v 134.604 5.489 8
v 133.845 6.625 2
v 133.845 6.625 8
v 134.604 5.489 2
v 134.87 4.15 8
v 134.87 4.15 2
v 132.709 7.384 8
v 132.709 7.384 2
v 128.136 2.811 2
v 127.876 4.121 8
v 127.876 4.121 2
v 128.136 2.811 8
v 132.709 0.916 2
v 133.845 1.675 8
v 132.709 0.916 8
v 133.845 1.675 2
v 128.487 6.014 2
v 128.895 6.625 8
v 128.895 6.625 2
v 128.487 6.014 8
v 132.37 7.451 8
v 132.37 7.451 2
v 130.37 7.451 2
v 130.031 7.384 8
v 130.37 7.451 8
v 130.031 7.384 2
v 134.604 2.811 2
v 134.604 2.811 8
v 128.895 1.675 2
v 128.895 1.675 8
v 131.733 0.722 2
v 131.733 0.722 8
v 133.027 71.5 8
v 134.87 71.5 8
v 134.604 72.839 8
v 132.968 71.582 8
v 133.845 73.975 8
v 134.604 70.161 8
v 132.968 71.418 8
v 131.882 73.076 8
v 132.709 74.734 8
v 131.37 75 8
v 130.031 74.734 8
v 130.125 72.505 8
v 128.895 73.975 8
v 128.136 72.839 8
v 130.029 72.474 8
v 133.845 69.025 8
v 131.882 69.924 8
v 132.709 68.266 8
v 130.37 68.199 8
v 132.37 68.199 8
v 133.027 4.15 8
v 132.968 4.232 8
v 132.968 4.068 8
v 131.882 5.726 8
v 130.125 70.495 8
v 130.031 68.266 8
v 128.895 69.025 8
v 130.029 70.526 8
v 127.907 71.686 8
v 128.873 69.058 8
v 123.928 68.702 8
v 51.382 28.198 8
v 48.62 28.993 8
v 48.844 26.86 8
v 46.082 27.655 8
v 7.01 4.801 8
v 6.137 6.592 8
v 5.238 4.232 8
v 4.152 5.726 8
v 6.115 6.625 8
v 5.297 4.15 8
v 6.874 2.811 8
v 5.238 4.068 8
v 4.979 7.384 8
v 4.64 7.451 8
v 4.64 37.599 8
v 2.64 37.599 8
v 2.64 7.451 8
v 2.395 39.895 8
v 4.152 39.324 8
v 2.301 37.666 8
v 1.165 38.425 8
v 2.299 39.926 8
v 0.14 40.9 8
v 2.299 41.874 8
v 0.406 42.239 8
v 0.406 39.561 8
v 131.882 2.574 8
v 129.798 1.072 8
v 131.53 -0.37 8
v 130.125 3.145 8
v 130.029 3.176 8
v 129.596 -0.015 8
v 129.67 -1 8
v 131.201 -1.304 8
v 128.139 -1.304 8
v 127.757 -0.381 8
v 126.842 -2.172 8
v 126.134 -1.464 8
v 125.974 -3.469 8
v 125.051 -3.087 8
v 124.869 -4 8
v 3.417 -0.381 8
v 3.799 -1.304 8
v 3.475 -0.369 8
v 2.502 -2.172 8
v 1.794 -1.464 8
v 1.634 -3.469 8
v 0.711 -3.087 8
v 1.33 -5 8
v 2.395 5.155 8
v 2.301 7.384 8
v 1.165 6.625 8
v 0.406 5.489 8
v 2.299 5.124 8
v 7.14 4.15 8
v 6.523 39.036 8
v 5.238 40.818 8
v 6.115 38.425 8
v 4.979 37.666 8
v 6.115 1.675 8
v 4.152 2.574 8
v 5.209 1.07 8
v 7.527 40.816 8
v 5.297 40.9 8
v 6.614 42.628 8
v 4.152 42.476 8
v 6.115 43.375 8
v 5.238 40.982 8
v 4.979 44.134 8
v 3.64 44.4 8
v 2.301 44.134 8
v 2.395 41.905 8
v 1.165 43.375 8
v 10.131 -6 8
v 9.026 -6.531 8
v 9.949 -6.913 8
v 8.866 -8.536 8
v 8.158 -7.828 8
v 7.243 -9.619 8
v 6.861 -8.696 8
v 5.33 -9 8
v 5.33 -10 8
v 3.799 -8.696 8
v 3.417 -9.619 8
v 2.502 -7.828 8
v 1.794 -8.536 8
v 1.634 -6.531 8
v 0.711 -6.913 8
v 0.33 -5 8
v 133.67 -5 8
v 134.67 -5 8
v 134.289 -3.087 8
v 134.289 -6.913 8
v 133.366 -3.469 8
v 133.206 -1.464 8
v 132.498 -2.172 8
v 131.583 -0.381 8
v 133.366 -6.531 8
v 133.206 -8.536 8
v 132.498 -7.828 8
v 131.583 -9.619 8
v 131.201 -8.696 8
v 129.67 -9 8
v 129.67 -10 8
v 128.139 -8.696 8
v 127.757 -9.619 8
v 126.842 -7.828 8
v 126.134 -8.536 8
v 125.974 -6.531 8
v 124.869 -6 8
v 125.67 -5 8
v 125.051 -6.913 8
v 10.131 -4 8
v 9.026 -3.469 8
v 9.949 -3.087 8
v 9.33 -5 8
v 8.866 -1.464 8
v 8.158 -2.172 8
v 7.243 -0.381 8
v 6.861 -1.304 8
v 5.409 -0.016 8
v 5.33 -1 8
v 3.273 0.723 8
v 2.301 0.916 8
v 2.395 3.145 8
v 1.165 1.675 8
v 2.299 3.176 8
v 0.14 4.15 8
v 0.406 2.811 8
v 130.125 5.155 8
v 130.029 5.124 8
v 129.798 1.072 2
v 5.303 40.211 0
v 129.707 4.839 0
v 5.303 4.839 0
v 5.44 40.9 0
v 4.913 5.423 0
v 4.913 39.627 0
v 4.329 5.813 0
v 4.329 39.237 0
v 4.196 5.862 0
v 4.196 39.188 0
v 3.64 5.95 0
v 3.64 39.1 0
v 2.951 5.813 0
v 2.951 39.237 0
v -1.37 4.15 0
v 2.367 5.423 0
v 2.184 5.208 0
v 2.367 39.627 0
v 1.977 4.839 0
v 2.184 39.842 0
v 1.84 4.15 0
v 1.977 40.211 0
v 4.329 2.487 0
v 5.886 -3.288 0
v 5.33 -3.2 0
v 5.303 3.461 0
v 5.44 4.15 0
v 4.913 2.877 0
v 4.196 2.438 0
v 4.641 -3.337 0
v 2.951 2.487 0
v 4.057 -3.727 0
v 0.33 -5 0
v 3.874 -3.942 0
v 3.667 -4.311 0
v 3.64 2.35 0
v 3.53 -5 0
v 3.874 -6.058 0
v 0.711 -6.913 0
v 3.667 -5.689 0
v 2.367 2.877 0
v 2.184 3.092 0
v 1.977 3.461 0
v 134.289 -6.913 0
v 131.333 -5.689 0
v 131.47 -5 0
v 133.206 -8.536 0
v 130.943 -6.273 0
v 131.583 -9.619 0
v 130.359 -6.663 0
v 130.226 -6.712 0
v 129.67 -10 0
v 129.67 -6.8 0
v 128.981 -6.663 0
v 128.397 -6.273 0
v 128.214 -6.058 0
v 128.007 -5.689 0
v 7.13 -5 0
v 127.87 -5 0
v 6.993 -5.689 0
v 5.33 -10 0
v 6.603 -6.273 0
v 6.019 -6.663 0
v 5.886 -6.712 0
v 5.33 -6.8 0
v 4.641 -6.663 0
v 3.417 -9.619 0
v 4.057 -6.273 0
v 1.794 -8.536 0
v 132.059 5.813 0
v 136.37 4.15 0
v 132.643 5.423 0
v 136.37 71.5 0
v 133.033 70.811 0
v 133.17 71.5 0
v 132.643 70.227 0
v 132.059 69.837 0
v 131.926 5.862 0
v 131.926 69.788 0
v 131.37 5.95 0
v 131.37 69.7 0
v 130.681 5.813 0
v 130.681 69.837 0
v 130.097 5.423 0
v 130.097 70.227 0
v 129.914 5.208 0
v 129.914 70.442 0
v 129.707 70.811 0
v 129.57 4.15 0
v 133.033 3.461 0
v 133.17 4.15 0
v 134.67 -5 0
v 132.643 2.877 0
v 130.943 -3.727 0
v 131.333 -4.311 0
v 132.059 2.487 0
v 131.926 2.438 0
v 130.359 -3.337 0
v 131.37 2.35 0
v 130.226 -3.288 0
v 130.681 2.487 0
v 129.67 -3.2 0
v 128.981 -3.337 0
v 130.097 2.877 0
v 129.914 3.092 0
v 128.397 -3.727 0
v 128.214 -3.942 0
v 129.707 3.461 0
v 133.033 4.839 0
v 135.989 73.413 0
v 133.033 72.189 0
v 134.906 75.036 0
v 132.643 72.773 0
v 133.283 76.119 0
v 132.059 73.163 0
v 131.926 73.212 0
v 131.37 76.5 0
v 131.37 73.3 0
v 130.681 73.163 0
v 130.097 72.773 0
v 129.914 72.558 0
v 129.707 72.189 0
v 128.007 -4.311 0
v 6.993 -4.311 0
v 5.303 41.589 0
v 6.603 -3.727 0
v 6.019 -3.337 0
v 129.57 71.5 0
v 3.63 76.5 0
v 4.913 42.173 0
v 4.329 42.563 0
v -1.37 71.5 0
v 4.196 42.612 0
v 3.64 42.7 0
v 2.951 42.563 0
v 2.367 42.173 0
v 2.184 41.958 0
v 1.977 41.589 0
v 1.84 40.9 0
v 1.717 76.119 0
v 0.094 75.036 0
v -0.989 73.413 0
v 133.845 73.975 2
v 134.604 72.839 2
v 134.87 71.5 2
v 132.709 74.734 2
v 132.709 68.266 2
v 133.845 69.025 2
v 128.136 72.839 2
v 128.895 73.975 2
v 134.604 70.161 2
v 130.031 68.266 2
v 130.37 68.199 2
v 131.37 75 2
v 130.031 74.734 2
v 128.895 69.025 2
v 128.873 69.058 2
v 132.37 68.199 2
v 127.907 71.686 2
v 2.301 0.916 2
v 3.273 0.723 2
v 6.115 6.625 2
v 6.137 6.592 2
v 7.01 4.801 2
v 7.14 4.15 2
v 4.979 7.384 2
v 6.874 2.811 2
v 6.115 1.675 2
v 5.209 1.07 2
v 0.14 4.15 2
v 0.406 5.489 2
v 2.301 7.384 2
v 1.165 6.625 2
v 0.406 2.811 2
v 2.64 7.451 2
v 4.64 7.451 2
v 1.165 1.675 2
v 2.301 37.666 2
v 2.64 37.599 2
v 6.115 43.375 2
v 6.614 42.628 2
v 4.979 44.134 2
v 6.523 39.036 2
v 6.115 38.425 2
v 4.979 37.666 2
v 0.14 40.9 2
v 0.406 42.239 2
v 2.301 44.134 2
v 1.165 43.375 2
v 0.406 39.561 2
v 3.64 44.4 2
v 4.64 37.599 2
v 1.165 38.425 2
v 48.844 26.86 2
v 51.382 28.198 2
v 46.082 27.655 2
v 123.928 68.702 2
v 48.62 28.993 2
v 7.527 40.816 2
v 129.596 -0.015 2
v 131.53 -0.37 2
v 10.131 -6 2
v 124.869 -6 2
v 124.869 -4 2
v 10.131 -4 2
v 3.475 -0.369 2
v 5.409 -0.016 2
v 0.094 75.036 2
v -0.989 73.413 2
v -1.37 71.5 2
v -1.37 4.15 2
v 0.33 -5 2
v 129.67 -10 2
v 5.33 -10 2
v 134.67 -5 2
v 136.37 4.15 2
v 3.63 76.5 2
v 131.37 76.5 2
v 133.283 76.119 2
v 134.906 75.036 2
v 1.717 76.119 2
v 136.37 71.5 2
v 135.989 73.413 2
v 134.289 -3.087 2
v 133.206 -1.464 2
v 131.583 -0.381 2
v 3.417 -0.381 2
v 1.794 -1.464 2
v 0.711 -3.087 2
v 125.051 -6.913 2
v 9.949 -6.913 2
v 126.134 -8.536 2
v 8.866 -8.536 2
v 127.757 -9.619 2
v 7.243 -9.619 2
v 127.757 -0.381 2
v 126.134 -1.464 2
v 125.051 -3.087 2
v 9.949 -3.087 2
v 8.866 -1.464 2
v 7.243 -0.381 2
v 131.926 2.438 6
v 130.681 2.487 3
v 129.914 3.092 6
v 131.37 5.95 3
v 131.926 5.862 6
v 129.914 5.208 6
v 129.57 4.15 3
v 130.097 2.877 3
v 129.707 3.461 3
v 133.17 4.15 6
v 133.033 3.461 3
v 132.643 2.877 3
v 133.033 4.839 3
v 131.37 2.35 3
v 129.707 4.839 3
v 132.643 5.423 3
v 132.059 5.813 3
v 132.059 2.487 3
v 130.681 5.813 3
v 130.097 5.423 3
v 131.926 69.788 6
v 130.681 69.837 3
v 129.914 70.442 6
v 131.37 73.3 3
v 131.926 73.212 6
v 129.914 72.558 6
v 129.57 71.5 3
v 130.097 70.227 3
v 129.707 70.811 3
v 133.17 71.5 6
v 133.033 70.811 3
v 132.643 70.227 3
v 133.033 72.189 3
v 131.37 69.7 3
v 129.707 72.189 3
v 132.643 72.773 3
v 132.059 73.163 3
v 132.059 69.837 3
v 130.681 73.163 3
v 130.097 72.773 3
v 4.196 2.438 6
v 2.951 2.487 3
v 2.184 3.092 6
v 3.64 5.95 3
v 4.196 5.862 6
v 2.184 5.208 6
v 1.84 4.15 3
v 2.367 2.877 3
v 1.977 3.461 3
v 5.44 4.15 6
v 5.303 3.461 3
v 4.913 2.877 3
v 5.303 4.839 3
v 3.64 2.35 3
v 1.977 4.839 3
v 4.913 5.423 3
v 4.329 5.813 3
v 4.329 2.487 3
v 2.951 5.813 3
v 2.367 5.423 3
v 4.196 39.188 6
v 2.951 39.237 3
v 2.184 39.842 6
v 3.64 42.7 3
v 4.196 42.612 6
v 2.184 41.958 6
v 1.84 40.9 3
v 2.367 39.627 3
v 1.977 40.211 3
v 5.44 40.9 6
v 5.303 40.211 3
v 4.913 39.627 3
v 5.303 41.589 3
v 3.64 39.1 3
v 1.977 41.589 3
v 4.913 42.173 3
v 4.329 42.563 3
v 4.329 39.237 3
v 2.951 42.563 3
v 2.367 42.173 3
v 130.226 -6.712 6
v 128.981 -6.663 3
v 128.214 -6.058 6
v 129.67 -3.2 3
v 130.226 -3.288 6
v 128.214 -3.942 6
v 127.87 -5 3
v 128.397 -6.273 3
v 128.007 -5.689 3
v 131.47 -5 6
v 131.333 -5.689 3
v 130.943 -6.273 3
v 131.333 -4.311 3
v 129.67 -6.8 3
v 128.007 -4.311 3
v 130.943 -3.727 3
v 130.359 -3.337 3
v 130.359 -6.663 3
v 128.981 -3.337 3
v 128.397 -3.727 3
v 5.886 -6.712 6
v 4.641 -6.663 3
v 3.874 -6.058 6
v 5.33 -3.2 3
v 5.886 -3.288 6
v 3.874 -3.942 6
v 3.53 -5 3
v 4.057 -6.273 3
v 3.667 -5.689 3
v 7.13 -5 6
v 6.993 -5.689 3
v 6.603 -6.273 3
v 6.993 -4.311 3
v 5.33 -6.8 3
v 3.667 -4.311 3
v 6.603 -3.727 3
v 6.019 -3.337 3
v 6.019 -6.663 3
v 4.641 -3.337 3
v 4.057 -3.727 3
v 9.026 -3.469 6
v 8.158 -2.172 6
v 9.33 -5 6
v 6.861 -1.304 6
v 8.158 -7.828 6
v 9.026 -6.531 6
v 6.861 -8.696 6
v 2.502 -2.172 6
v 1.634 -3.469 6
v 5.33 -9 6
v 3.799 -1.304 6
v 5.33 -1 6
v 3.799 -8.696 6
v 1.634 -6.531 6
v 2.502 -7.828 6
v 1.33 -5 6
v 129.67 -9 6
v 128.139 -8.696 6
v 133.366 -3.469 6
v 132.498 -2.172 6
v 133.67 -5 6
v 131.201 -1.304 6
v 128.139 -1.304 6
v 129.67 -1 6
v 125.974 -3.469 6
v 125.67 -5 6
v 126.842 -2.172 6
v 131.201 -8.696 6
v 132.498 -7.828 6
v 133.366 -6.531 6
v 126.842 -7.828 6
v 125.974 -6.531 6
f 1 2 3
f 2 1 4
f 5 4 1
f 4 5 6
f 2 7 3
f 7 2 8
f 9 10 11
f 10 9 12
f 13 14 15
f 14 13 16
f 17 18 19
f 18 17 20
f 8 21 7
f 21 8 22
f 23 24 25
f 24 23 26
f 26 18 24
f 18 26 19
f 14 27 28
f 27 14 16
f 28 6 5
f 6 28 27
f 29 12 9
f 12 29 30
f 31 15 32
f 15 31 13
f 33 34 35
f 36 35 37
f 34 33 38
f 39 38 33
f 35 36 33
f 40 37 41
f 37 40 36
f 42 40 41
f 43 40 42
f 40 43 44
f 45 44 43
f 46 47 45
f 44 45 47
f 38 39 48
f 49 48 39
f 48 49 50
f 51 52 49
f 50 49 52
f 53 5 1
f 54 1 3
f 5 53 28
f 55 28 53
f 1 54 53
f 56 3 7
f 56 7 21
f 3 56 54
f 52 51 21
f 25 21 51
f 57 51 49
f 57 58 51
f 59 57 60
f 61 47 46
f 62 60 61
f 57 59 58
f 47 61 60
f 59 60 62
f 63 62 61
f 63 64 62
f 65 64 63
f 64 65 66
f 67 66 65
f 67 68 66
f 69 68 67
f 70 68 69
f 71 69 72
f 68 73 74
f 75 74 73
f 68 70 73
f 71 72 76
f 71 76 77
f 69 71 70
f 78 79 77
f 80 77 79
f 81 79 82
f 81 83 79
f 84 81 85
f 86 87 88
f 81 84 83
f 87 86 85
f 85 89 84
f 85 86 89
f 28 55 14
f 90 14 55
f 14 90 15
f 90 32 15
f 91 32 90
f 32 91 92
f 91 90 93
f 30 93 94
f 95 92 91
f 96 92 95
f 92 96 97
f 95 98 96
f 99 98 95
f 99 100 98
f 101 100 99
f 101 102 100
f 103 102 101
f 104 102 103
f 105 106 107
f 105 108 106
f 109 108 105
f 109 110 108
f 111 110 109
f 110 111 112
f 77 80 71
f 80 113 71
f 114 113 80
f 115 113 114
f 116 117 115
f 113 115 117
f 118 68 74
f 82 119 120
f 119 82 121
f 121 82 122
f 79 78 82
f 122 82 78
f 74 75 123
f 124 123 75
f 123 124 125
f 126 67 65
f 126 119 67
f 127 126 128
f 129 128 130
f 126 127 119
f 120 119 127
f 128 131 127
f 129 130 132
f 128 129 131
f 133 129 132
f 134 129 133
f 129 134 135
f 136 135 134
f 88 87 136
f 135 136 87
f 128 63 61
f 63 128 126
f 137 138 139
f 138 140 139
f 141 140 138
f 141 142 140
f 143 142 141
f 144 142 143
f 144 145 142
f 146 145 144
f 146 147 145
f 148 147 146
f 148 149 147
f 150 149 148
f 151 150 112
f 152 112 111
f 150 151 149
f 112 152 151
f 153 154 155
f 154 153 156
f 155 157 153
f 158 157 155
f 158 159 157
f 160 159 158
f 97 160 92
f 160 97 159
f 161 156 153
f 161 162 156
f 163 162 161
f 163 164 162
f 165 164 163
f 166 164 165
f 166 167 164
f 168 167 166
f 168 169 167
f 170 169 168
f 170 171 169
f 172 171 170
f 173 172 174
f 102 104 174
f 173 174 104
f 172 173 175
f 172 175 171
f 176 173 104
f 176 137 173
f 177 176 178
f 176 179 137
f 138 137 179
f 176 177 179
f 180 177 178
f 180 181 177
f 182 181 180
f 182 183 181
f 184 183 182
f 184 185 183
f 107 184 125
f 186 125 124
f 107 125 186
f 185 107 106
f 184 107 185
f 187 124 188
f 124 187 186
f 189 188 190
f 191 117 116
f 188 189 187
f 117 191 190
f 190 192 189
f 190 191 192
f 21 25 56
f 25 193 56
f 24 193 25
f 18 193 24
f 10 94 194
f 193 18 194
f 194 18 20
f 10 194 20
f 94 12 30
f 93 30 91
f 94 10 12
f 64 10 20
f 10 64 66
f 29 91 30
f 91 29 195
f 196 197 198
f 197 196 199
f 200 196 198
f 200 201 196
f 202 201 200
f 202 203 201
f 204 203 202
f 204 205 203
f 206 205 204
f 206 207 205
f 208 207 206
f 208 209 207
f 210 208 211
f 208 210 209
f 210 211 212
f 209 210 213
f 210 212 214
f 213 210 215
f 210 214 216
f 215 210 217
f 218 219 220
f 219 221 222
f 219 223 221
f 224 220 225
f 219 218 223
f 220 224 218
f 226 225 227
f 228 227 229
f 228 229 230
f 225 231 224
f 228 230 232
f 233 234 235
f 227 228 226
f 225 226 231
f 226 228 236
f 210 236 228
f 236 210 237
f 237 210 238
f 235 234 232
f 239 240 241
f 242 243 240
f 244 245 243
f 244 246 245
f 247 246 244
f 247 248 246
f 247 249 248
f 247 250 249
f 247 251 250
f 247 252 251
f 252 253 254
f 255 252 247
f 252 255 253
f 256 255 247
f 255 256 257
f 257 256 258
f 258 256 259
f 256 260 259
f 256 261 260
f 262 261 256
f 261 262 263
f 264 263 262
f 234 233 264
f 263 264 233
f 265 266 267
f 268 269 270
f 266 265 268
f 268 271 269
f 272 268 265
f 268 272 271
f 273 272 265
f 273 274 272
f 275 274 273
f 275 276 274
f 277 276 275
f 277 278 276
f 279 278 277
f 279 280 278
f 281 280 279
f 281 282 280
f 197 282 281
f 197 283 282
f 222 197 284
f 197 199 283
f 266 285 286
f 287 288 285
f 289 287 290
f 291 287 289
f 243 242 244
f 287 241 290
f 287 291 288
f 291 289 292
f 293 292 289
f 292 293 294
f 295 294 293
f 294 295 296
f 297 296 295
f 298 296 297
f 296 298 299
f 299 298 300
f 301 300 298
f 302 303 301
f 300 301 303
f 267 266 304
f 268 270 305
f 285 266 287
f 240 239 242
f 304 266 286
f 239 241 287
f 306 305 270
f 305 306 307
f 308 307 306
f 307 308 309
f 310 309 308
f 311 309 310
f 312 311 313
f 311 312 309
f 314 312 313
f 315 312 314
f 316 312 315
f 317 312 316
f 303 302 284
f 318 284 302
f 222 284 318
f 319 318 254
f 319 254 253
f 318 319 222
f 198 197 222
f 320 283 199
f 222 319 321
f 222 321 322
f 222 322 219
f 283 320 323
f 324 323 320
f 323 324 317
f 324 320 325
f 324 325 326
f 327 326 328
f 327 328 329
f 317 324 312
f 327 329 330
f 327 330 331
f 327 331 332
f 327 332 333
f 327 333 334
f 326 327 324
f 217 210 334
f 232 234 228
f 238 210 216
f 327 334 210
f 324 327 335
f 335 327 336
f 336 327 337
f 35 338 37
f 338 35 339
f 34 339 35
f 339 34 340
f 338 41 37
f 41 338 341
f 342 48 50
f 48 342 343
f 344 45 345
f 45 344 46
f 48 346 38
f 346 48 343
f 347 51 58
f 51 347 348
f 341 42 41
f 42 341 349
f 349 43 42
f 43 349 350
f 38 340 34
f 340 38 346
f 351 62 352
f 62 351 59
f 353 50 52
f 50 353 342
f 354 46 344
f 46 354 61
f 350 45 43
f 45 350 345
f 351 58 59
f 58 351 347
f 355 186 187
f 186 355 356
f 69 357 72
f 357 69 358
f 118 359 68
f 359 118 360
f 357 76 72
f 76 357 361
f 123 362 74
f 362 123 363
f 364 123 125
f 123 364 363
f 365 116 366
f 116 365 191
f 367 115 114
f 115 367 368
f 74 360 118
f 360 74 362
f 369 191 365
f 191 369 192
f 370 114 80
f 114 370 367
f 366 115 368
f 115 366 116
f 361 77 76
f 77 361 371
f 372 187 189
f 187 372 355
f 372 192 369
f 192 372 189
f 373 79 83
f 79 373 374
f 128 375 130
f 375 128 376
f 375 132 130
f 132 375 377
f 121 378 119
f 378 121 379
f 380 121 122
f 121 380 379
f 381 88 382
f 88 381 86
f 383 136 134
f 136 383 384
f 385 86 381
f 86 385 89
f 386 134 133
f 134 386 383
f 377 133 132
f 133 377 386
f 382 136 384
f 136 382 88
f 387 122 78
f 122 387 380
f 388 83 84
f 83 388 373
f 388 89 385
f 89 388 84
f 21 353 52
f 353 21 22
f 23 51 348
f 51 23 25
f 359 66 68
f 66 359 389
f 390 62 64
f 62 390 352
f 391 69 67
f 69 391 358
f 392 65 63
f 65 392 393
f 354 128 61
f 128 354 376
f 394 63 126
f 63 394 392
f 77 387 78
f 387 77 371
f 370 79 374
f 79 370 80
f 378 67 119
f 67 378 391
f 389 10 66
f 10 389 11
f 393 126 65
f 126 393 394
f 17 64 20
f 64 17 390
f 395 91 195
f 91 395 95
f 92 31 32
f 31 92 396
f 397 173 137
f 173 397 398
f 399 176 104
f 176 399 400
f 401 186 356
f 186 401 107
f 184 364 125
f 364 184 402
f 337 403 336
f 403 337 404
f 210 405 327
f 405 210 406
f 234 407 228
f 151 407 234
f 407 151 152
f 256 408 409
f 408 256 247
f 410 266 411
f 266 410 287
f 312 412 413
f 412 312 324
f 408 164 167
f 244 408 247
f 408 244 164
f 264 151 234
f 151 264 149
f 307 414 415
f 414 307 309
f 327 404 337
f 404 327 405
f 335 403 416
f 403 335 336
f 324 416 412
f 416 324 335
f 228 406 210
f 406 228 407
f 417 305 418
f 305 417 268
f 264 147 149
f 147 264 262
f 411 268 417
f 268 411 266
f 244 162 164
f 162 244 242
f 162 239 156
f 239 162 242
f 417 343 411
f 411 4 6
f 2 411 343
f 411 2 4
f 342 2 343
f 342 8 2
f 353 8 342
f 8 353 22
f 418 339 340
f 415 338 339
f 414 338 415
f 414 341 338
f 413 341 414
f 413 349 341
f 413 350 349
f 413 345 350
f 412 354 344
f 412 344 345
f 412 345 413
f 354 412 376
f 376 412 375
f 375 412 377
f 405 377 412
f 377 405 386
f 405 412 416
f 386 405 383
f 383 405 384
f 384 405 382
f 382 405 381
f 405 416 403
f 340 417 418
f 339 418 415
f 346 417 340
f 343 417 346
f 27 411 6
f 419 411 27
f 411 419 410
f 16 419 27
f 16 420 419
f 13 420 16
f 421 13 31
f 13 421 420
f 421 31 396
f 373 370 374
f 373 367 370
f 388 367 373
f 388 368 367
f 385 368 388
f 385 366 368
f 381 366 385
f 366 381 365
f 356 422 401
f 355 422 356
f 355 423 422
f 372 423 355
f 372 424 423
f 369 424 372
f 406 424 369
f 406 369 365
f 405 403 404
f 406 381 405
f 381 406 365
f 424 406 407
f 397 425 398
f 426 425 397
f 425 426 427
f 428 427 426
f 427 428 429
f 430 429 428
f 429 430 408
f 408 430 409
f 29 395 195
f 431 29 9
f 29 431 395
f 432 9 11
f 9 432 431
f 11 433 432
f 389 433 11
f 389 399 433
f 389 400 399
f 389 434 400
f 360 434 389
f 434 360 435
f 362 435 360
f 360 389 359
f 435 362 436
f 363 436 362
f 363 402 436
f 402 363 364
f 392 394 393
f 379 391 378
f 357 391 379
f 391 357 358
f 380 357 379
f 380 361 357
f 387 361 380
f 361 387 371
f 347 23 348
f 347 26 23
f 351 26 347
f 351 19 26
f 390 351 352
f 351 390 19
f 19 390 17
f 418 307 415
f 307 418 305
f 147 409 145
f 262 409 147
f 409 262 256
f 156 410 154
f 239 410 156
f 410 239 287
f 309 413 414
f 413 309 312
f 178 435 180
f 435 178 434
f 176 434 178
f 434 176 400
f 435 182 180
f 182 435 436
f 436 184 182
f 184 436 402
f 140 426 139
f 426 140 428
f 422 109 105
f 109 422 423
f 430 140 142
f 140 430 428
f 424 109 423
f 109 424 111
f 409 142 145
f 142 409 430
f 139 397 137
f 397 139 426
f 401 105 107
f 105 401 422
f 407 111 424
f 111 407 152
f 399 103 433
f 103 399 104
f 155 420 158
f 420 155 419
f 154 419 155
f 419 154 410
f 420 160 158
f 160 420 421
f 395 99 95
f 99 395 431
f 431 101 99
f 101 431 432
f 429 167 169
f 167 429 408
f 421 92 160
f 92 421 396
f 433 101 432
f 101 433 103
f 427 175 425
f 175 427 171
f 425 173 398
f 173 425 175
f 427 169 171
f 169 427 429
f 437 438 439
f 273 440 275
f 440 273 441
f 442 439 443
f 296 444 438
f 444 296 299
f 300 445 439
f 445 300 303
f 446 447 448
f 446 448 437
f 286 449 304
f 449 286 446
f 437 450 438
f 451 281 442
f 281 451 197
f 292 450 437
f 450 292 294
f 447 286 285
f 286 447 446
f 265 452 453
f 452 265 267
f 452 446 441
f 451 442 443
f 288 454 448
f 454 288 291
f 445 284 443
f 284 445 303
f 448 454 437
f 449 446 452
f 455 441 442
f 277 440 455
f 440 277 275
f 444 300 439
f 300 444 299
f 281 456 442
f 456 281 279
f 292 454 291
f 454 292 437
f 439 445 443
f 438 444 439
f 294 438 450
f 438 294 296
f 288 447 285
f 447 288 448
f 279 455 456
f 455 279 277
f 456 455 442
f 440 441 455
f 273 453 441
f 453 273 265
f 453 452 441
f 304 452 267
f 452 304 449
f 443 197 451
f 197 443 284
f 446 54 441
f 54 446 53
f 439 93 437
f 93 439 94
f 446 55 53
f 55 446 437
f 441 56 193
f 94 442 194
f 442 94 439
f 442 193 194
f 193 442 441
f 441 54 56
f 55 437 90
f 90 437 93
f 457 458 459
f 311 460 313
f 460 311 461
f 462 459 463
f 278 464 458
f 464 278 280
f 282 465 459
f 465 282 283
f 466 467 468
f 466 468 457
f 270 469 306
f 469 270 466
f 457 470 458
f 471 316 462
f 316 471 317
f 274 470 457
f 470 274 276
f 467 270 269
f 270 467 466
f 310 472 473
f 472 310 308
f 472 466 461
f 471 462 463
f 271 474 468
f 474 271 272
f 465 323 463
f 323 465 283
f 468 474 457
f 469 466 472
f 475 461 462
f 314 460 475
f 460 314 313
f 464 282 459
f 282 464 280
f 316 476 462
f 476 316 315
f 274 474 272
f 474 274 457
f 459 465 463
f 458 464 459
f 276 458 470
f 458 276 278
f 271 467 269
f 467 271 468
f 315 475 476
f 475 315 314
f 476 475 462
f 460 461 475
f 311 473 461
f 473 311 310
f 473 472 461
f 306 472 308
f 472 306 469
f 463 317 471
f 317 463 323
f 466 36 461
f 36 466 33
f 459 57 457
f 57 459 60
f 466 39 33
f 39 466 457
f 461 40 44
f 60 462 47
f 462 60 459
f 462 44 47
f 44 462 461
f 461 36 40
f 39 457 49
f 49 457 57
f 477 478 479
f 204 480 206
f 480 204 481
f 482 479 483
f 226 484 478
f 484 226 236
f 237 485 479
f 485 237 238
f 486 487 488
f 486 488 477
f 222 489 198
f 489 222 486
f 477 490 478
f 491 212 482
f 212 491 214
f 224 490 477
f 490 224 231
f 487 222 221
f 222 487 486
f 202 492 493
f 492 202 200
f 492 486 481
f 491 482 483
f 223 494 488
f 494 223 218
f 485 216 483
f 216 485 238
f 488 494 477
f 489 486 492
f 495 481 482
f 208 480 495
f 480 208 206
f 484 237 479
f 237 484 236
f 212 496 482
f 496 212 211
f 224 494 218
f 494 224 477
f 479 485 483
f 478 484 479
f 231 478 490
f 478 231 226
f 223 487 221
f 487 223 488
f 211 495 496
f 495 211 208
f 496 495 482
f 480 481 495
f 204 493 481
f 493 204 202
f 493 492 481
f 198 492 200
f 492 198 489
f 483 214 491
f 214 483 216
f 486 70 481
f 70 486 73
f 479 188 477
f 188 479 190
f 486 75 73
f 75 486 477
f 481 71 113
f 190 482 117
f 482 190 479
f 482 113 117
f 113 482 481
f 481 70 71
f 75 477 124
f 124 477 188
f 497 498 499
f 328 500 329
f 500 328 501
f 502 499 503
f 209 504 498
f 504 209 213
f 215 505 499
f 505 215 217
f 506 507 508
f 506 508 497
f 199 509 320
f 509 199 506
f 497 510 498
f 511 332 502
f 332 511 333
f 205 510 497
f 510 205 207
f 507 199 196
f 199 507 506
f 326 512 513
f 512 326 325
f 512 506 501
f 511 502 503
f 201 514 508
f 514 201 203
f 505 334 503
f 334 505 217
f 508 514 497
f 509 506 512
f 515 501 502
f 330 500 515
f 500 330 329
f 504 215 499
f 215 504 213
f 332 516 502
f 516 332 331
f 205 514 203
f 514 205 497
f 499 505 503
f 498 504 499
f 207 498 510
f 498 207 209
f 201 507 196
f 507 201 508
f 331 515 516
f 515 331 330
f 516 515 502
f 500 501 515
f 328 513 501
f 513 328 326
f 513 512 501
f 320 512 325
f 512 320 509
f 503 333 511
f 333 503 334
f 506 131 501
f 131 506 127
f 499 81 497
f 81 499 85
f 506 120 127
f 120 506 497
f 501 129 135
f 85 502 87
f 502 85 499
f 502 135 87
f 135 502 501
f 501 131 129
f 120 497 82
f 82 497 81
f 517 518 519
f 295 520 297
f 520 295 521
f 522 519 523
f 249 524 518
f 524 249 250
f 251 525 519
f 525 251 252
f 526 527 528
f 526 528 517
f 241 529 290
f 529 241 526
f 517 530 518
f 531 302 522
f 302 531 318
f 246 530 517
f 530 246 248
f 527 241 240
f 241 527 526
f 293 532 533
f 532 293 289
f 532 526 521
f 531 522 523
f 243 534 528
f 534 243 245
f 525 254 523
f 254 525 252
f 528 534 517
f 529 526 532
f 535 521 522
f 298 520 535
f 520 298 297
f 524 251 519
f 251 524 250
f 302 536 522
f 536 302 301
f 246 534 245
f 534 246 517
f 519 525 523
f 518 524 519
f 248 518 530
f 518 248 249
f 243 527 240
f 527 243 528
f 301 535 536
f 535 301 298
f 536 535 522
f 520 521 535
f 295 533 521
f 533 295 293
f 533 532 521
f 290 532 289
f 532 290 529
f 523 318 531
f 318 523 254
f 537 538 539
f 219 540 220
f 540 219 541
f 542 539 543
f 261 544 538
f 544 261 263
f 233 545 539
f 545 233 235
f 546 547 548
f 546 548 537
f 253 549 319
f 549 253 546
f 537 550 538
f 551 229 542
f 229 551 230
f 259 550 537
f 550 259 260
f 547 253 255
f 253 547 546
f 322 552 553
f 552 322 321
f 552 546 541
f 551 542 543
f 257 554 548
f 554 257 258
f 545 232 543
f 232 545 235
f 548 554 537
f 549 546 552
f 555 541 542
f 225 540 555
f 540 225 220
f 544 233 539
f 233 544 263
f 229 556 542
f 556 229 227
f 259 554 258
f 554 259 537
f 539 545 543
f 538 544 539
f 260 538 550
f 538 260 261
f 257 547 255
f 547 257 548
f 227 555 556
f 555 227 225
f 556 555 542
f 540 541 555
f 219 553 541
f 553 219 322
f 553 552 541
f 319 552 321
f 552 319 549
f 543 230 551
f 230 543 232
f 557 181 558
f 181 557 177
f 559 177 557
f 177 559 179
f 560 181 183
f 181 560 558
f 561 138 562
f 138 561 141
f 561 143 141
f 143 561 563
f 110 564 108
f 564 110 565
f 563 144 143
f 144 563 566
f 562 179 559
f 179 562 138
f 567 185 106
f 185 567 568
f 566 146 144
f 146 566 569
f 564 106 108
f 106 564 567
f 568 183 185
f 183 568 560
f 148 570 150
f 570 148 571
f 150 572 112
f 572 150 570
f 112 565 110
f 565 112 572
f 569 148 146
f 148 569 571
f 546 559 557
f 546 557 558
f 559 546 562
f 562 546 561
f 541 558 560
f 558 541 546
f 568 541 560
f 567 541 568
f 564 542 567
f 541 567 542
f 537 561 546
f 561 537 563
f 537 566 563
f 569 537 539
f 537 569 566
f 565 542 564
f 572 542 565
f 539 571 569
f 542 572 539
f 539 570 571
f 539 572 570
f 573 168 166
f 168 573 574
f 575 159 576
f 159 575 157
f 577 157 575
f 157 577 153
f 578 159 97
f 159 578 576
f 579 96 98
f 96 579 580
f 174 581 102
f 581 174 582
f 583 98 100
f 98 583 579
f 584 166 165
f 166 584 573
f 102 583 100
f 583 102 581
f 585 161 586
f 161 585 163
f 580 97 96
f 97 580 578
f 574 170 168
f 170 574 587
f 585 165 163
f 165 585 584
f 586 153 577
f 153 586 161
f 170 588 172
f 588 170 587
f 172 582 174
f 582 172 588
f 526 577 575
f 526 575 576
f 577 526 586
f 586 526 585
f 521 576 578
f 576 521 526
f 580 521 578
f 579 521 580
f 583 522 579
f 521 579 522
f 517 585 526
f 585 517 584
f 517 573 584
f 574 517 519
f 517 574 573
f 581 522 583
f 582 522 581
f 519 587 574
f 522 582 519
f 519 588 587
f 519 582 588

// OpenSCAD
boardHeight = 75.33;
boardWidth = 135;

screwHoleDiameter = 3.5;

height = 8;

bracketScrewHoleWidth = (121.72+126.96)/2;

screwHoles = [
	[ 1.88+1.75, 2.4+1.75],
	[ 1.88+1.75, 2.4+1.75+70.85-3.5],
	[ 1.88+1.75+124.23+3.5, 2.4+1.75],
	[ 1.88+1.75+124.23+3.5, 2.4+1.75+33.25+3.5],
	[boardWidth/2-bracketScrewHoleWidth/2,-5],
	[boardWidth/2+bracketScrewHoleWidth/2,-5],
];

crossSupportList = [
	[ 0, 1 ],
	[ 1, 2 ],
	[ 1, 3 ],
	[ 3, 2 ],
	[ 0, 3 ],
	[ 0, 4 ],
	[ 4, 5 ],
	[ 2, 5 ],
];


module InnerScrew() {
	union(){
		hull() {
			cylinder(h=height-5, d=3.6, $fn=16);
			cylinder(h=height-2, d=3.6, $fn=5);
		}
		translate([0,0,height-2])cylinder(h=2.1, d1=3.6, d2=3.3, $fn=5);
	}
}

module OuterPart() {

	hull()
	{
		for (screwHole = screwHoles) {
			translate(screwHole)
			cylinder(h=2, d=10, $fn=16);
			translate([boardWidth-screwHole.x,screwHole.y])
			cylinder(h=2, d=10, $fn=16);
		}
/*
		for (screwHole = screwHoles) {

			for (screwHole2 = screwHoles) {
				hull() {
					translate(screwHole)
					cylinder(h=2, d=10, $fn=16);
					translate(screwHole2)
					cylinder(h=2, d=10, $fn=16);
				}
				hull() {
					translate([boardWidth-screwHole.x,screwHole.y])
					cylinder(h=2, d=10, $fn=16);
					translate([boardWidth-screwHole2.x,screwHole2.y])
					cylinder(h=2, d=10, $fn=16);
				}
			}
		}
*/
		translate([boardWidth/2-bracketScrewHoleWidth/2,-5,0])
			cylinder(h=2, d=10, $fn=16);
		translate([boardWidth/2+bracketScrewHoleWidth/2,-5,0])
			cylinder(h=2, d=10, $fn=16);
	}

//	cube([boardWidth, boardHeight, 2]);

//	translate([boardWidth/2, boardHeight/2+4, 1])
//	cube([boardWidth+20, 10, 2],center=true);

	for (screwHole = screwHoles) {
		translate([boardWidth-screwHole.x,screwHole.y])
		cylinder(h=height, d=7, $fn=16);


	}
	for (indexes = crossSupportList) {
		hull() {
			translate([boardWidth-screwHoles[indexes[0]].x,screwHoles[indexes[0]].y])
			cylinder(h=height, d=2, $fn=16);
			translate([boardWidth-screwHoles[indexes[1]].x,screwHoles[indexes[1]].y])
			cylinder(h=height, d=2, $fn=16);
		}
	}

	translate([boardWidth/2-bracketScrewHoleWidth/2,-5,0])
		cylinder(h=height, d=10, $fn=16);
	translate([boardWidth/2+bracketScrewHoleWidth/2,-5,0])
		cylinder(h=height, d=10, $fn=16);


}

module InnerPart() {
	for (screwHole = screwHoles) {
		translate([boardWidth-screwHole.x,screwHole.y])
		InnerScrew();
	}
	translate([boardWidth/2-bracketScrewHoleWidth/2,-5,height-2])
		cylinder(h=height, d=8, $fn=16);
	translate([boardWidth/2+bracketScrewHoleWidth/2,-5,height-2])
		cylinder(h=height, d=8, $fn=16);

}


difference() {
	OuterPart();
	InnerPart();
}
